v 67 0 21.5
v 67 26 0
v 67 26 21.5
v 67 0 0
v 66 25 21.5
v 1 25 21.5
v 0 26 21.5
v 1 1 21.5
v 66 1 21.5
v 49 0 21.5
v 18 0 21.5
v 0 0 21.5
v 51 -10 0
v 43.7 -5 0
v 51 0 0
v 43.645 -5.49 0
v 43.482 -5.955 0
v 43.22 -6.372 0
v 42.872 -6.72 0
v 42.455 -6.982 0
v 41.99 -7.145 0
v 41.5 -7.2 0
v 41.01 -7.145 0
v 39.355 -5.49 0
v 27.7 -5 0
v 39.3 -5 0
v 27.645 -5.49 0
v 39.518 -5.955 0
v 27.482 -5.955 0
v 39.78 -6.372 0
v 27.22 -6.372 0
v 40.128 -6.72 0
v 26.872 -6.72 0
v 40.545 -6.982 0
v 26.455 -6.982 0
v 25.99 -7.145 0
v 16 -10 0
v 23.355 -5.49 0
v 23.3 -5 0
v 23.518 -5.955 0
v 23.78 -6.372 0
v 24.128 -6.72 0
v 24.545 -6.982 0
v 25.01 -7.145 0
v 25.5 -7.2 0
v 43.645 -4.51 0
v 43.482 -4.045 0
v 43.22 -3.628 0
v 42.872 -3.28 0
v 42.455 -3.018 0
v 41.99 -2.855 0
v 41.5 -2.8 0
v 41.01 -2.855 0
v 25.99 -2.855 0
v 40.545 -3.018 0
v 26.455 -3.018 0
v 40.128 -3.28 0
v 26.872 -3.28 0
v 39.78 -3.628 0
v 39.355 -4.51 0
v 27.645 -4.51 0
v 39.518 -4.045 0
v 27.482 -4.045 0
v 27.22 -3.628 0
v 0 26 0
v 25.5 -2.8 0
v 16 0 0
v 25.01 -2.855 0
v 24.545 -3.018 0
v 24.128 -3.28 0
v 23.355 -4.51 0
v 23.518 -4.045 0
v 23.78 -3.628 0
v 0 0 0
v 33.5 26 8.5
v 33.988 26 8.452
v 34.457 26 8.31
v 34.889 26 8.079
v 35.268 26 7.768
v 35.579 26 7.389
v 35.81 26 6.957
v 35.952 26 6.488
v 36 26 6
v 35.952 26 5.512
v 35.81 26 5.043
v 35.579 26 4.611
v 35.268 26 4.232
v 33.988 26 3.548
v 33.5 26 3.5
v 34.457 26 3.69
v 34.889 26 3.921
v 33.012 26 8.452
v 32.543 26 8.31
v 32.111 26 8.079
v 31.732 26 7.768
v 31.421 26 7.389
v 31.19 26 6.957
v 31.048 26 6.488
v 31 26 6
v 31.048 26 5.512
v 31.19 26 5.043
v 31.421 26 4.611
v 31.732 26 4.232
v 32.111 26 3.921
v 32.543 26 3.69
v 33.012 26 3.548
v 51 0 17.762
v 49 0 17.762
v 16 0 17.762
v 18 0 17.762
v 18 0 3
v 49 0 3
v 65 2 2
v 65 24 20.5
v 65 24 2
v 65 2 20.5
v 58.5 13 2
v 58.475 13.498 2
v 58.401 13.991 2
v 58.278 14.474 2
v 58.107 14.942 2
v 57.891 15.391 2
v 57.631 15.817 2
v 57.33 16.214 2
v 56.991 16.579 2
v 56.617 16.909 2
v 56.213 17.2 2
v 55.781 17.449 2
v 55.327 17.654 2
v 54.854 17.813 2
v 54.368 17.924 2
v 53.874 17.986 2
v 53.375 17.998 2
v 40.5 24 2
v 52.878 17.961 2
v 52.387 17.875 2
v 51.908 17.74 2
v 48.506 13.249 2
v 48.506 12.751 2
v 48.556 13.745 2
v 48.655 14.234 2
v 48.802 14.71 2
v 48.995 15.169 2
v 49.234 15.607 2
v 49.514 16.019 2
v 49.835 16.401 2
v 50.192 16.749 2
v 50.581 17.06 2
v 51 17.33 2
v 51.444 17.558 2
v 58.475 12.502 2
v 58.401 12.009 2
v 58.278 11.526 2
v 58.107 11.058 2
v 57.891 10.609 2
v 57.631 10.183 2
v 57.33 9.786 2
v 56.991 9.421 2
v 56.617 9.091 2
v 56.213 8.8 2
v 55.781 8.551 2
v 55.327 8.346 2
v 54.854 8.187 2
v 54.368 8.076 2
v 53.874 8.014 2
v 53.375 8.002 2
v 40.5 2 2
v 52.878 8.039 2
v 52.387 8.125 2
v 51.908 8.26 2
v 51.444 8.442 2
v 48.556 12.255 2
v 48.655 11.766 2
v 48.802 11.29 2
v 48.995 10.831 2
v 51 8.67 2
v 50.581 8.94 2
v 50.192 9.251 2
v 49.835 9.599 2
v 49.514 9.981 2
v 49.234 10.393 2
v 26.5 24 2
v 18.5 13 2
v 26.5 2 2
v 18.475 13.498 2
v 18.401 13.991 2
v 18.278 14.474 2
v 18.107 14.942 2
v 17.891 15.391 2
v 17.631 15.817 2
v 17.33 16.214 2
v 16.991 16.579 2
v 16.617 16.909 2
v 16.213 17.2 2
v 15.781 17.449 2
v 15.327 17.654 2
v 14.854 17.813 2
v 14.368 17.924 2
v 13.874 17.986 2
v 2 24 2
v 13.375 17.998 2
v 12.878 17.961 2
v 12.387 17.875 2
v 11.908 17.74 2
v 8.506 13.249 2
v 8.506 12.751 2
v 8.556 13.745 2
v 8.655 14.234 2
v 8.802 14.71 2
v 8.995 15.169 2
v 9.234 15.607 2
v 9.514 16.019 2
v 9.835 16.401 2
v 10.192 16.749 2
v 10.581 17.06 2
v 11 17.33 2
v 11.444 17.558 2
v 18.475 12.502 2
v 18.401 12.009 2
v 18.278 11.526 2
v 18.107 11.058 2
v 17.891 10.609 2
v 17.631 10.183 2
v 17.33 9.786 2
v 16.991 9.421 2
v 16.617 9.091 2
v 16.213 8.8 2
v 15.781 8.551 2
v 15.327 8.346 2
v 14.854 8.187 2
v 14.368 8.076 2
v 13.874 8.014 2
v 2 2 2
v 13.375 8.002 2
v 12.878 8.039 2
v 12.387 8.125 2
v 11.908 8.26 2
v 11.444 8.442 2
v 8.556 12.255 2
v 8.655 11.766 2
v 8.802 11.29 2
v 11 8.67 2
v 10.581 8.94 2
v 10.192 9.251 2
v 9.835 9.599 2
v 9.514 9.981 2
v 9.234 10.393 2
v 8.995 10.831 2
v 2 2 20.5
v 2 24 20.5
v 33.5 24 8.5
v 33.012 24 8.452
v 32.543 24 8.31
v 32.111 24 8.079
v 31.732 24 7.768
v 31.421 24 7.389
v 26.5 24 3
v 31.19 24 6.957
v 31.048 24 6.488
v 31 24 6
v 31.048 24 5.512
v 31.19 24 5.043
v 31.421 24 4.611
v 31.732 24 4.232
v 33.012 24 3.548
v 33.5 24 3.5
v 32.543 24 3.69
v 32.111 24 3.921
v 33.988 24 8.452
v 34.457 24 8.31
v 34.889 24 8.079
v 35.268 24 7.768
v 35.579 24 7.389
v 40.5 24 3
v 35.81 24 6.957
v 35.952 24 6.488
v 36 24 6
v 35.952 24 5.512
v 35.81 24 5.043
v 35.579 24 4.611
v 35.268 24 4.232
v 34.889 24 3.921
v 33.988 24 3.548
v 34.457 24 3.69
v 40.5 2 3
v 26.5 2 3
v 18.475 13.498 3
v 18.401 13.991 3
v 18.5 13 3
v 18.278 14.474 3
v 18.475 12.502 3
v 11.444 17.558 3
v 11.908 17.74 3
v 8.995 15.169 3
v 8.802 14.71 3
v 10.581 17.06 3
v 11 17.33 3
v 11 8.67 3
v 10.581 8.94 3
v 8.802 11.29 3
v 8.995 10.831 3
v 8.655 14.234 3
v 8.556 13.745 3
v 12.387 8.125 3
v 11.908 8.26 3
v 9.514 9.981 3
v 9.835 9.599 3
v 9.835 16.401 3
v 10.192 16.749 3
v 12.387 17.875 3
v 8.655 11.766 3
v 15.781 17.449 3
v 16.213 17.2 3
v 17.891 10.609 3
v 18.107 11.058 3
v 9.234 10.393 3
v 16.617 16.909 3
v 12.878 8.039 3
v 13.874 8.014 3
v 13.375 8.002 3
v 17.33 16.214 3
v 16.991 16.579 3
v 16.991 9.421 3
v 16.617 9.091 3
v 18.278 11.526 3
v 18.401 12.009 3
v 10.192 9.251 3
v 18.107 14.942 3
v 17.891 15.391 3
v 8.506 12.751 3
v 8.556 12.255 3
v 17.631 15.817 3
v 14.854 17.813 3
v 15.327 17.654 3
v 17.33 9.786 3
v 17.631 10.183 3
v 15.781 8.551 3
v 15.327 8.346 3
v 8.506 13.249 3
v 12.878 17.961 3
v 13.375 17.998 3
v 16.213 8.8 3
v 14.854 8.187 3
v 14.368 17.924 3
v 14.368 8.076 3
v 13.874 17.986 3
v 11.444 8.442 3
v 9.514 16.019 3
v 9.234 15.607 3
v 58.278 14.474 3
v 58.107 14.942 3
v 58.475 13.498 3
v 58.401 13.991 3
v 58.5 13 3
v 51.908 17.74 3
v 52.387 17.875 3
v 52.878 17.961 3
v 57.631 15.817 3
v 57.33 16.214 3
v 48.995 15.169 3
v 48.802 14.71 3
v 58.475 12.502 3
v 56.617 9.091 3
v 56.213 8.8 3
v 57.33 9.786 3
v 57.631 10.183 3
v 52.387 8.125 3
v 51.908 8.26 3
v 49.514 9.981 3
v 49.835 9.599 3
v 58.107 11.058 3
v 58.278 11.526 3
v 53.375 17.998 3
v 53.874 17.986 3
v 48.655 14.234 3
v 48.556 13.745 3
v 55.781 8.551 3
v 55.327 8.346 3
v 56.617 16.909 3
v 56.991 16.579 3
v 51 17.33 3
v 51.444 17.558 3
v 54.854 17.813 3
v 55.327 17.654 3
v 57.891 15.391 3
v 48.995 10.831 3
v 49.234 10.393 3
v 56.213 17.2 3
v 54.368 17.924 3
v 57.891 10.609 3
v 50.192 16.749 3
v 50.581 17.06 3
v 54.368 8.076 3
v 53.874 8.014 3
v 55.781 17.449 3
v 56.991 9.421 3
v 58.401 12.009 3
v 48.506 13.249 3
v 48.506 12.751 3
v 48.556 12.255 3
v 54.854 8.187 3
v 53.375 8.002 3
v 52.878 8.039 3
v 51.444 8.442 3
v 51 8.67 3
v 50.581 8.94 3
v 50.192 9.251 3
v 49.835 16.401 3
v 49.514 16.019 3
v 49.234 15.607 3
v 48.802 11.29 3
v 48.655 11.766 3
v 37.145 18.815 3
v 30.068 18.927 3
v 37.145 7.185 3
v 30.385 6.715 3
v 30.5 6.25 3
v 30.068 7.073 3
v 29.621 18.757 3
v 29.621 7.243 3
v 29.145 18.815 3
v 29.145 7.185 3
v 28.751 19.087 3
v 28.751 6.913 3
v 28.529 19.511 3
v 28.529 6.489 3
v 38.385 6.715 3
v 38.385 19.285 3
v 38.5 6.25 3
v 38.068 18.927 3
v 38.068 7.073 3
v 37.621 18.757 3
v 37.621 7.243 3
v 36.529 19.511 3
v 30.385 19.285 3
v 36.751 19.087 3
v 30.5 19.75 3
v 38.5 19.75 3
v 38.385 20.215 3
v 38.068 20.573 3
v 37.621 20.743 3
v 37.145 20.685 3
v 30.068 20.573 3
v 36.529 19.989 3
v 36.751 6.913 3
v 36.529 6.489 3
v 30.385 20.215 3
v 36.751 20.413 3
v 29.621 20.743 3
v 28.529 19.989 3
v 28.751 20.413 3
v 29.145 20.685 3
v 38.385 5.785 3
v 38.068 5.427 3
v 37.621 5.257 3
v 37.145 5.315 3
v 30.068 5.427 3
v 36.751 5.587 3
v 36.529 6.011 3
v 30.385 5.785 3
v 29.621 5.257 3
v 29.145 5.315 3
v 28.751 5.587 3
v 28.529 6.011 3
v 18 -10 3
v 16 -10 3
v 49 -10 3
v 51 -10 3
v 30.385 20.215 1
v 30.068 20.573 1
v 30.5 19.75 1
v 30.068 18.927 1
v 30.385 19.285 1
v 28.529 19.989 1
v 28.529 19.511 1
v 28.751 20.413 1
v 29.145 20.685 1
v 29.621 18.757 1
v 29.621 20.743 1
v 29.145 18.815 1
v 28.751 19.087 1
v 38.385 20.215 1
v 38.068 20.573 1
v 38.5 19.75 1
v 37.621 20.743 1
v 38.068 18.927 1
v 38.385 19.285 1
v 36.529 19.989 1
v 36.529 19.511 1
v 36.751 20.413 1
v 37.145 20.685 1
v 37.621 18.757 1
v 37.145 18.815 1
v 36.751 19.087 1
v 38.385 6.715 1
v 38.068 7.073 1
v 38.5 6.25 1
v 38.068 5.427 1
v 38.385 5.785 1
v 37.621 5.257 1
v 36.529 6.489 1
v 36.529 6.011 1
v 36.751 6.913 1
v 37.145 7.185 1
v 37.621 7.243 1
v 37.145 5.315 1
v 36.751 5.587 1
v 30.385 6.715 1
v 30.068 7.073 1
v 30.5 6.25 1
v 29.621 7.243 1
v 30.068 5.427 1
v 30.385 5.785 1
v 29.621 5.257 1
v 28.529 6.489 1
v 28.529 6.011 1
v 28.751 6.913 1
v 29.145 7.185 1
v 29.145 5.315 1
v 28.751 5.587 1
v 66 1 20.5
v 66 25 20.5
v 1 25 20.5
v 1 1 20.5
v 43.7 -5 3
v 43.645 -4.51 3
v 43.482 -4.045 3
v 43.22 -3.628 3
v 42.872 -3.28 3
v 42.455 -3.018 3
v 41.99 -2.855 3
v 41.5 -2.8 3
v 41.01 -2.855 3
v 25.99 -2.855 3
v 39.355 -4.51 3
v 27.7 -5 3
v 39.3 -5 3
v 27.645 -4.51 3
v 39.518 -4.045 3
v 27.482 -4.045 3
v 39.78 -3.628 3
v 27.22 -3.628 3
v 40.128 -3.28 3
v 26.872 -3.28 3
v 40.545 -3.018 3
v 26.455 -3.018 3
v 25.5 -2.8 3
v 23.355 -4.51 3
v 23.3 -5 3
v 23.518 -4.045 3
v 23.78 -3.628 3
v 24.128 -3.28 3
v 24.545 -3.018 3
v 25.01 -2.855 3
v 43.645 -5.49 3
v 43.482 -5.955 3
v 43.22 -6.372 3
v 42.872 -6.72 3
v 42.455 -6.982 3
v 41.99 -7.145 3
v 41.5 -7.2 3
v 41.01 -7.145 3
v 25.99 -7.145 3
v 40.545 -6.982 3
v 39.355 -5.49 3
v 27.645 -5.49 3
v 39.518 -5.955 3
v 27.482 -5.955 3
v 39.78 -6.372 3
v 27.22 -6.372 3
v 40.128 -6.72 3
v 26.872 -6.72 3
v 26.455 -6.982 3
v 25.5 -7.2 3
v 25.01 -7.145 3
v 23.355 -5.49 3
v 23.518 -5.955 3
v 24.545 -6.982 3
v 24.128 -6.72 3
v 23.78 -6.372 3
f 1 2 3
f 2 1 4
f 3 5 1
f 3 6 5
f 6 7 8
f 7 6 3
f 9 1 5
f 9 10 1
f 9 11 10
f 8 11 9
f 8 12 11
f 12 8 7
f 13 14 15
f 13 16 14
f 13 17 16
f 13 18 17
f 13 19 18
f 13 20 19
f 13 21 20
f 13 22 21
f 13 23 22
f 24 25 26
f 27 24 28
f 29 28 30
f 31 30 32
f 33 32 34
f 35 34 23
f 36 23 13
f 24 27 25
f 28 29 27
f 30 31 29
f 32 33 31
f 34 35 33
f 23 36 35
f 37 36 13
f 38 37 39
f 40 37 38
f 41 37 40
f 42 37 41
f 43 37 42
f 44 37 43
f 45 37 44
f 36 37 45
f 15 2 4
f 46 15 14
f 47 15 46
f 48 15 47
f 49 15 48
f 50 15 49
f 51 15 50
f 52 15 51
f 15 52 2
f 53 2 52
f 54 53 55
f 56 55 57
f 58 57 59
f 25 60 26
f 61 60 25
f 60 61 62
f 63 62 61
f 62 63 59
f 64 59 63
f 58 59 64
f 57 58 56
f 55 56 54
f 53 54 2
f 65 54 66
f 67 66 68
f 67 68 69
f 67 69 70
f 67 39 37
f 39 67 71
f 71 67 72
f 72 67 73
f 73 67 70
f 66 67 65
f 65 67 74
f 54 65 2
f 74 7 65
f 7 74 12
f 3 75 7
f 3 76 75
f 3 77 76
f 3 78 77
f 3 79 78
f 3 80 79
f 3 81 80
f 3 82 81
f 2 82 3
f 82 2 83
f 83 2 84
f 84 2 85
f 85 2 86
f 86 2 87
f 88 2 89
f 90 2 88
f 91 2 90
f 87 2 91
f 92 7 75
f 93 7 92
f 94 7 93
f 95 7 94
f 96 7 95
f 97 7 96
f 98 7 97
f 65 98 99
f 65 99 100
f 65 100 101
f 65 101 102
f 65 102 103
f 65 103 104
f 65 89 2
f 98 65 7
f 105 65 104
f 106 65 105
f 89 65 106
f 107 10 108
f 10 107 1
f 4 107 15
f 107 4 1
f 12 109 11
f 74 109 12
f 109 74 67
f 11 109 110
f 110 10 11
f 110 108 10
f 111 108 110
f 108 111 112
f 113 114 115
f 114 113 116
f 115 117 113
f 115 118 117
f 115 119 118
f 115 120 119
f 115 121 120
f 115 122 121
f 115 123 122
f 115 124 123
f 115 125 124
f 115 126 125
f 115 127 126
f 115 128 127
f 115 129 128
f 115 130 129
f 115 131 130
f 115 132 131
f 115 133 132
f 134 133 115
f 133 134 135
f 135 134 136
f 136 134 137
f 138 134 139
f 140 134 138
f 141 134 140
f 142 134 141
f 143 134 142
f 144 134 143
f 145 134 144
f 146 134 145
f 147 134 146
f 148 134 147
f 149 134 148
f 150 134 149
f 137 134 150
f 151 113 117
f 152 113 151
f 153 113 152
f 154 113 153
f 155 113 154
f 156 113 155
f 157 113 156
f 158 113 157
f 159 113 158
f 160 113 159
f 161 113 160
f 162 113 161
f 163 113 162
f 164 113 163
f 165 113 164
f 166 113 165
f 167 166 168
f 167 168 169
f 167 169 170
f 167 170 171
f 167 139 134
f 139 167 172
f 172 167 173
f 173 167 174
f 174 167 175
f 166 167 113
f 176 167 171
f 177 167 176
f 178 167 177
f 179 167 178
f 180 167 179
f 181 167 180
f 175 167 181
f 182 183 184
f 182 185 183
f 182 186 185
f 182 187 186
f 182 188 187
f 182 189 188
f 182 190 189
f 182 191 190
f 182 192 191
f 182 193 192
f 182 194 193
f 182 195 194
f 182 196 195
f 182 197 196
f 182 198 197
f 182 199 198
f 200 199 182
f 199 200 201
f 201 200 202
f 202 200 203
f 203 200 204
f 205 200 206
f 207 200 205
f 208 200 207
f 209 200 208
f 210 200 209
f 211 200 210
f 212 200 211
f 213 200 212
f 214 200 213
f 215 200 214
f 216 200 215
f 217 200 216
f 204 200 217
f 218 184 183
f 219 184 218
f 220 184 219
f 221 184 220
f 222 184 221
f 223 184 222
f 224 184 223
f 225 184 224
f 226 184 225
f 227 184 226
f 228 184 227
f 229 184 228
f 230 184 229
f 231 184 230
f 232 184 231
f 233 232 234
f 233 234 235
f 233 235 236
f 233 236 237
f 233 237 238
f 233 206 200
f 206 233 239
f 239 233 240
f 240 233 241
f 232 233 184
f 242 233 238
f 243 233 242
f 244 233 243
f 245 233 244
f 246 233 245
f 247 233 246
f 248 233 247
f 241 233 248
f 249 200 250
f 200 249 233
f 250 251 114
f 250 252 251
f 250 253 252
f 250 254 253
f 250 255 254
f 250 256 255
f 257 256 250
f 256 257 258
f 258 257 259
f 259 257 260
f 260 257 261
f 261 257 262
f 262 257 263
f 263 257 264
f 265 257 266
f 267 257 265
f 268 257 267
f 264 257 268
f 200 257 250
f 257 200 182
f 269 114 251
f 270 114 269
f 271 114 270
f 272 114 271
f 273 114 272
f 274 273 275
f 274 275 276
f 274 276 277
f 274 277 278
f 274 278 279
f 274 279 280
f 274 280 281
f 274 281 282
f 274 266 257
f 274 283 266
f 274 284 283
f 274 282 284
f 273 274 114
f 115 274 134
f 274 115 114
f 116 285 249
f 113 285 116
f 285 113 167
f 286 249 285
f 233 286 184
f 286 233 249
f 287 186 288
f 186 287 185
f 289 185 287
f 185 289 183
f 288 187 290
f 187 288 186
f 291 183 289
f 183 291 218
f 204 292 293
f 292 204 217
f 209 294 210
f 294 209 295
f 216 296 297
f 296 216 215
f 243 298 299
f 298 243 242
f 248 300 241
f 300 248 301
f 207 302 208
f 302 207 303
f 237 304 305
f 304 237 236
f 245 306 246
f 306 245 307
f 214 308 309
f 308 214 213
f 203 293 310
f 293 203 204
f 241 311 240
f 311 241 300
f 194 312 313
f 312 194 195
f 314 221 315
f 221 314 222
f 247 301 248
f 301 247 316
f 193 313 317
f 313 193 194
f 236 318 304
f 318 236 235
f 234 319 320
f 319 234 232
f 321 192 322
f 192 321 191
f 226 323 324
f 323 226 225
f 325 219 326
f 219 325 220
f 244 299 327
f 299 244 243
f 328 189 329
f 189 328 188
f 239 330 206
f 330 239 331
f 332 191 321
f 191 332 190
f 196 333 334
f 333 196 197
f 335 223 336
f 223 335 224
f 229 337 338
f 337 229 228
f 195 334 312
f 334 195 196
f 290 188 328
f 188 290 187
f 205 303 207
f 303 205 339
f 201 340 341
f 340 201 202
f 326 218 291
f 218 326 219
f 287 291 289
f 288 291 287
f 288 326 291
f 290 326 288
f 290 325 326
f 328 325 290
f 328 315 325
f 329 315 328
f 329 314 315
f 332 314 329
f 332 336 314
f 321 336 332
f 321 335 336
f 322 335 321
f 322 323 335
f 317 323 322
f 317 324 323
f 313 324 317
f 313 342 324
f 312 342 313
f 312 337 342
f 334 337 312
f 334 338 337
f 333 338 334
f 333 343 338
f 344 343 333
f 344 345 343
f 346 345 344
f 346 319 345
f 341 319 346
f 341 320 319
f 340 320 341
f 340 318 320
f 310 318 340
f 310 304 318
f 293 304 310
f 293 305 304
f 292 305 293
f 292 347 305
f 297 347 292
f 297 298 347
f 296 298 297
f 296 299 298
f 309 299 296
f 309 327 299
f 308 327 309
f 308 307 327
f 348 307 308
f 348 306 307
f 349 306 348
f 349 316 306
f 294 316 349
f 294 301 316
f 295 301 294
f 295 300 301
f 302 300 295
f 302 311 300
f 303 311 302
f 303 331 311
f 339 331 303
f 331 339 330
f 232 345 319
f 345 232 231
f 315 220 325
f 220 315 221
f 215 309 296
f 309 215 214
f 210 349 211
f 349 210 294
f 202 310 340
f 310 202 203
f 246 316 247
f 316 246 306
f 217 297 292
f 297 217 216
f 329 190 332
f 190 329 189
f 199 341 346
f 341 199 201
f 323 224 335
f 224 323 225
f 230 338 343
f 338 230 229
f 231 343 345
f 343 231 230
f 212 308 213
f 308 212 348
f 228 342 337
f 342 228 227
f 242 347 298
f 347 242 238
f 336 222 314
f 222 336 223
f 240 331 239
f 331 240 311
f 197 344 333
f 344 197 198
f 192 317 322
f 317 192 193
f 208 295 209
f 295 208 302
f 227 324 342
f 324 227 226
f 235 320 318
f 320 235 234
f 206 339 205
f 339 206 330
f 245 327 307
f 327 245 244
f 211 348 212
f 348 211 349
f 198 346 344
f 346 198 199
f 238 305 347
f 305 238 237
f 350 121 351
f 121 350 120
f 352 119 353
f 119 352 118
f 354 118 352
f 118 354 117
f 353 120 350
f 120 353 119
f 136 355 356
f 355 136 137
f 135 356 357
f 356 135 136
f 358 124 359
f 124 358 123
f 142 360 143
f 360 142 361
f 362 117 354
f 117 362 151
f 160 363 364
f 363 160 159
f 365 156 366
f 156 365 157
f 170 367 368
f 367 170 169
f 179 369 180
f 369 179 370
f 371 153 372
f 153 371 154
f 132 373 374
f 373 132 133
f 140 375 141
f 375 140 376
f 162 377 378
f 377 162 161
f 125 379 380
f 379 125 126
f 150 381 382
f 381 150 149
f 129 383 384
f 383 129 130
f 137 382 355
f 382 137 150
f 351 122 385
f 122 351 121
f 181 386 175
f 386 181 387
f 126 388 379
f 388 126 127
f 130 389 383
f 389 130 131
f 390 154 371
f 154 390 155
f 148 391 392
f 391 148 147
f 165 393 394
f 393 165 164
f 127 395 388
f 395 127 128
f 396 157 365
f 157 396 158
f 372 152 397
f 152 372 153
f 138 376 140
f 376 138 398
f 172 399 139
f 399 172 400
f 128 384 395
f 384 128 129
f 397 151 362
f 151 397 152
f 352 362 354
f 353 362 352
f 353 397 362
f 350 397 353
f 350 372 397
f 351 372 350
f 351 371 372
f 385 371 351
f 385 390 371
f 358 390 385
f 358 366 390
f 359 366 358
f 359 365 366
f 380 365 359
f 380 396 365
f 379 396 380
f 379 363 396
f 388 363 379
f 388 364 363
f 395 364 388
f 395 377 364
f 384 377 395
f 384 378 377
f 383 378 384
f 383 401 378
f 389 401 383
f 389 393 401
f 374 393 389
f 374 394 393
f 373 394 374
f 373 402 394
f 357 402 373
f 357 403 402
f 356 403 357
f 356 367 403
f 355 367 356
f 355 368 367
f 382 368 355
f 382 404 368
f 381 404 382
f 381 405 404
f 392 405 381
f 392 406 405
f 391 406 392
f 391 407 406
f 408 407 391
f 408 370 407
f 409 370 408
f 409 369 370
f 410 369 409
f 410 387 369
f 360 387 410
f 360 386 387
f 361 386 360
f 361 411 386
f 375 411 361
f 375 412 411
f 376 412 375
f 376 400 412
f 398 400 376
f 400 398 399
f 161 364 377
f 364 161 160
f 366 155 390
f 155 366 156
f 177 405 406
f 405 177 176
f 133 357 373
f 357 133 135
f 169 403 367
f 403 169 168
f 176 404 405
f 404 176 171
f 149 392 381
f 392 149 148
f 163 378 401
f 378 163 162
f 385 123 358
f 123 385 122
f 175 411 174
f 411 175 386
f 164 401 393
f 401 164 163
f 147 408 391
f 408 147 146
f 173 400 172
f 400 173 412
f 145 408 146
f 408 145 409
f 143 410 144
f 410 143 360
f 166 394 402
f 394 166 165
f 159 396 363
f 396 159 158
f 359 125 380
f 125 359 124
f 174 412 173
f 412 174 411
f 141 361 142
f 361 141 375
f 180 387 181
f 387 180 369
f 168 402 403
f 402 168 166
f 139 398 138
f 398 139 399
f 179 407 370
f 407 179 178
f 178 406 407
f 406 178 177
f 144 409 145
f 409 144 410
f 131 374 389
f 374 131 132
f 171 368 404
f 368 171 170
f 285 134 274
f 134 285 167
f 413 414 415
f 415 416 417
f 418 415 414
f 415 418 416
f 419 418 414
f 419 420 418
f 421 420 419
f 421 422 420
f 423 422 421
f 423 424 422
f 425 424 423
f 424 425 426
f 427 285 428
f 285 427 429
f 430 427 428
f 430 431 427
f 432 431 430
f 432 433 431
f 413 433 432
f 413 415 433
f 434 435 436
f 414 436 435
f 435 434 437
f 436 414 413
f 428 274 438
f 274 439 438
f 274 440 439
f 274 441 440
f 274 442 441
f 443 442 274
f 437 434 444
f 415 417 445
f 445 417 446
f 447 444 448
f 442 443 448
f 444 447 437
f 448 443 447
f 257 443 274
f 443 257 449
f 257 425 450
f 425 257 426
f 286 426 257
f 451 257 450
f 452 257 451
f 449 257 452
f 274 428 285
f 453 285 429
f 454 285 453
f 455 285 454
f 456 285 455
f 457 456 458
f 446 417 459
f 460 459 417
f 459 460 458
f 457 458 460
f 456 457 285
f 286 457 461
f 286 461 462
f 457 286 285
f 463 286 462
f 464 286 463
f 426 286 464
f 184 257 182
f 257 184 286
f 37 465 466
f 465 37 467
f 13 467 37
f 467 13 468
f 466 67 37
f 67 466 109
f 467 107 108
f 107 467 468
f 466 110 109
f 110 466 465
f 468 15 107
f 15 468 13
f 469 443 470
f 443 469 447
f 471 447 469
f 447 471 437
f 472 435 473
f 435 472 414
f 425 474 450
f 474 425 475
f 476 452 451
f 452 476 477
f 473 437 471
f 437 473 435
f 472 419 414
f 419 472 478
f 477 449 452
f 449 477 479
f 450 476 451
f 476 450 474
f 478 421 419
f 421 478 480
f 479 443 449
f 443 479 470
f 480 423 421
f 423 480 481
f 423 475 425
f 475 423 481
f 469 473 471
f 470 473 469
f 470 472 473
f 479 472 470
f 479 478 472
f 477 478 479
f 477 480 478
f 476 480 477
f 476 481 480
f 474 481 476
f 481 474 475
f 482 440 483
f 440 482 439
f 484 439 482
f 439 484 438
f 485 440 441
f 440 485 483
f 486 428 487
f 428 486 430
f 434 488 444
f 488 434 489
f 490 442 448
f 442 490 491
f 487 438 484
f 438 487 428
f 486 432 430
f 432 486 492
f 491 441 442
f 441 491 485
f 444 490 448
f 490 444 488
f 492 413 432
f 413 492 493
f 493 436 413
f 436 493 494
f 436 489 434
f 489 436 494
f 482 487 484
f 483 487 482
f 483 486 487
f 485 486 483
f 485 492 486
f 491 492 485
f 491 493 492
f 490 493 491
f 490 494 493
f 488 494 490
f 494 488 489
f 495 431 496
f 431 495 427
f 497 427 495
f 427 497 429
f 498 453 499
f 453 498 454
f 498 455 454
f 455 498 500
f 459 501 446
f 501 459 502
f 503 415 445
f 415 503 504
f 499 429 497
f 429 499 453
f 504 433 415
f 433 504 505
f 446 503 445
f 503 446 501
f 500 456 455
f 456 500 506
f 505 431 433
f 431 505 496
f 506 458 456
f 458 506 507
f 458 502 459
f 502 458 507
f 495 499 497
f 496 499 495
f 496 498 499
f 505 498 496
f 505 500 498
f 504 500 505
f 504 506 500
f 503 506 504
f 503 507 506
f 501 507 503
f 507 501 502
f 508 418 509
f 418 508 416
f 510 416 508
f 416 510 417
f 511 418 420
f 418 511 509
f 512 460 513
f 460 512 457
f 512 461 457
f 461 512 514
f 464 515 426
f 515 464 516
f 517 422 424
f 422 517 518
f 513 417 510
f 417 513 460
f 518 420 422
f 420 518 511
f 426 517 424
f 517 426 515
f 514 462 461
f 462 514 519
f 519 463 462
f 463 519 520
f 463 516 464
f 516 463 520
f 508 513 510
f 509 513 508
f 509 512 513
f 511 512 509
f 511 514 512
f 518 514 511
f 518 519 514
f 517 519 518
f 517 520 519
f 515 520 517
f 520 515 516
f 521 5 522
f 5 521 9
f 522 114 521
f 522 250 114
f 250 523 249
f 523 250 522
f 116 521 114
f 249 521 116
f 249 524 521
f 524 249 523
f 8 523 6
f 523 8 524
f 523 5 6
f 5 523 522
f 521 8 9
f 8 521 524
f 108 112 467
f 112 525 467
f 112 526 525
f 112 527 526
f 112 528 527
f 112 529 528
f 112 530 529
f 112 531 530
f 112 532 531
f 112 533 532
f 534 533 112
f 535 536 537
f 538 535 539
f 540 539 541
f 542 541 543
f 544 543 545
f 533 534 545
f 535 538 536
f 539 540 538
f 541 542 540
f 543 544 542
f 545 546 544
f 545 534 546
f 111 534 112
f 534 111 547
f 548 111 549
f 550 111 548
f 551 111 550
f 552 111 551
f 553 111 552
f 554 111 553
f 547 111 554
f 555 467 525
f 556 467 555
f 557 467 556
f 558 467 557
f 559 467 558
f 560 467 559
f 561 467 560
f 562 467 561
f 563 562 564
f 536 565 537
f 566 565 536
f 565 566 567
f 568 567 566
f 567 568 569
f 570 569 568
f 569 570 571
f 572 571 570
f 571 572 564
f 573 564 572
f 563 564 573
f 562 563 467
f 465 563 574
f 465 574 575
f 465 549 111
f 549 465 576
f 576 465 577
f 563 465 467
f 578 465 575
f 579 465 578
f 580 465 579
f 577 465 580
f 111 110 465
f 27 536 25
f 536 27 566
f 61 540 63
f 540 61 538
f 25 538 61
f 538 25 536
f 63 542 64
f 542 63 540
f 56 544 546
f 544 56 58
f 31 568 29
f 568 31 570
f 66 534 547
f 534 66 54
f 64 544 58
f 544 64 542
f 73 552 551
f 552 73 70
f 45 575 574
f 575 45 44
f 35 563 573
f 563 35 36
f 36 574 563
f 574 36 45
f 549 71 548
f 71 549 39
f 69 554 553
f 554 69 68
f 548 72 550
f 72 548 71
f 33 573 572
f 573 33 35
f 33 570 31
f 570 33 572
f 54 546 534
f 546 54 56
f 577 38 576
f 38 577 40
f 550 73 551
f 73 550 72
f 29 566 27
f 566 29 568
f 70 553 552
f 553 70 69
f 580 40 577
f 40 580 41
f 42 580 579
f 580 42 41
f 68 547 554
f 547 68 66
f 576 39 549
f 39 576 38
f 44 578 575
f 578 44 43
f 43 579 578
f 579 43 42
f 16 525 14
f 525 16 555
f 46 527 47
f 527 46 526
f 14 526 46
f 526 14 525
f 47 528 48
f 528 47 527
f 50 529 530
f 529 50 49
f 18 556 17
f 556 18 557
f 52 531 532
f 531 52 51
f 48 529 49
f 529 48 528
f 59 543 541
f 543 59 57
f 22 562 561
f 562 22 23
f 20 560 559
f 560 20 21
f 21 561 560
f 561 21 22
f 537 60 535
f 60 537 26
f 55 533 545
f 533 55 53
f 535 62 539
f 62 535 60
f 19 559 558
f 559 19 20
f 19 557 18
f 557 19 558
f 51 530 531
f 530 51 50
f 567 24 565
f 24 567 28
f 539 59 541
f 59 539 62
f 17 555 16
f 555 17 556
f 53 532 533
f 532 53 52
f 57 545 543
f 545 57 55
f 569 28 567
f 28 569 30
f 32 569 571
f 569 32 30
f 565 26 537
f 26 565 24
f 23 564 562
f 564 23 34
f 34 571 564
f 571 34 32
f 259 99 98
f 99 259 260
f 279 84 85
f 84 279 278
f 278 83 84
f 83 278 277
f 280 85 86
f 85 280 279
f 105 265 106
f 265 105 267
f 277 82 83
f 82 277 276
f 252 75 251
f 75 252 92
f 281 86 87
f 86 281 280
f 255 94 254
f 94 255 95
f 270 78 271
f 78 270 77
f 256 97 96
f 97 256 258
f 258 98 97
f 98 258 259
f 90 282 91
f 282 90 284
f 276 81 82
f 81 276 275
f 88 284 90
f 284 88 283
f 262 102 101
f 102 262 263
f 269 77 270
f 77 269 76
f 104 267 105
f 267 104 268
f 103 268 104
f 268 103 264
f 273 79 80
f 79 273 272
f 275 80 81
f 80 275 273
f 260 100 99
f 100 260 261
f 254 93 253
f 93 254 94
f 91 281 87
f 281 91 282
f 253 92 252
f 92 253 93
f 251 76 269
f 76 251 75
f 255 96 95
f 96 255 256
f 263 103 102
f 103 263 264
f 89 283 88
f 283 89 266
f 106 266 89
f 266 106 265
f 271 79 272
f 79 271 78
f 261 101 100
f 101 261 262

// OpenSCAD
// file: config.scad
$fs=0.5;

di_m4_t = 3.6;
di_m4_d = 4.4;

di_m4_nut = 8.5;

di_m2_t = 1.8;
// main file
$fa = 5;
$fs = 0.2;
include <config.scad>

w = 63;
l = 22;
h = 16;
t = 2;
led_stand = 1;
p = 2.5;
module ir_lights_case() {
    difference() {
        union() {
            difference() {
                cube([w+2*t, l+2*t, h+t+led_stand+p]);
                translate([t, t, t]) cube([w, l, h+t+led_stand+p]);
            }
            translate([w/2+t, l/2+t, 0]) {
                translate([-20, 0, 0]) cylinder(d=10, h=t+led_stand);
                translate([20, 0, 0]) cylinder(d=10, h=t+led_stand);
                translate([0, 0, (t+led_stand)/2]) cube([14, l, t+led_stand], center=true);
            }
            translate([w/2+t, 0, 1.5])
            hull() {
                translate([0, -5, 0]) cube([35, 10, 3], center=true);
                translate([0, 1, 10]) cube([35, 1, 14], center=true);
                
            }
        }
        translate([w/2+t, l/2+t, 1]) {
            translate([-4, 13.5/2, 0]) cylinder(d=2, h=10);
            translate([4, 13.5/2, 0]) cylinder(d=2, h=10);
            translate([4, -13.5/2, 0]) cylinder(d=2, h=10);
            translate([-4, -13.5/2, 0]) cylinder(d=2, h=10);
            
        }
        translate([t/2, t/2, h+t+p])
        cube([w+t, l+t, p*2]);
        
        // 
        translate([w/2+t-31/2, -10, 3])
        cube([31, 10, 30]);
        
        // screw holes
        translate([w/2+t-16/2, -5, 0])
        cylinder(d=di_m4_d, h=4);
        translate([w/2+t+16/2, -5, 0])
        cylinder(d=di_m4_d, h=4);
        
        // Hole for cable
        translate([w/2+t, 10, 6])
        rotate([-90, 0, 0])
        cylinder(d=5, h=30);
    }
}

module lid() {
    g = 0.2;
    difference() {
        cube([w+4*t, l+4*t, t+3]);
        translate([t-g, t-g, t]) cube([w+2*t+2*g, l+2*t+2*g, t+3]);
        hull() {
            translate([l/2+2*t, l/2+2*t, 0]) cylinder(d=21, h=5);
            translate([w+4*t-l/2-2*t, l/2+2*t, 0]) cylinder(d=21, h=5);
        }
    }
}
//lid();
ir_lights_case();
